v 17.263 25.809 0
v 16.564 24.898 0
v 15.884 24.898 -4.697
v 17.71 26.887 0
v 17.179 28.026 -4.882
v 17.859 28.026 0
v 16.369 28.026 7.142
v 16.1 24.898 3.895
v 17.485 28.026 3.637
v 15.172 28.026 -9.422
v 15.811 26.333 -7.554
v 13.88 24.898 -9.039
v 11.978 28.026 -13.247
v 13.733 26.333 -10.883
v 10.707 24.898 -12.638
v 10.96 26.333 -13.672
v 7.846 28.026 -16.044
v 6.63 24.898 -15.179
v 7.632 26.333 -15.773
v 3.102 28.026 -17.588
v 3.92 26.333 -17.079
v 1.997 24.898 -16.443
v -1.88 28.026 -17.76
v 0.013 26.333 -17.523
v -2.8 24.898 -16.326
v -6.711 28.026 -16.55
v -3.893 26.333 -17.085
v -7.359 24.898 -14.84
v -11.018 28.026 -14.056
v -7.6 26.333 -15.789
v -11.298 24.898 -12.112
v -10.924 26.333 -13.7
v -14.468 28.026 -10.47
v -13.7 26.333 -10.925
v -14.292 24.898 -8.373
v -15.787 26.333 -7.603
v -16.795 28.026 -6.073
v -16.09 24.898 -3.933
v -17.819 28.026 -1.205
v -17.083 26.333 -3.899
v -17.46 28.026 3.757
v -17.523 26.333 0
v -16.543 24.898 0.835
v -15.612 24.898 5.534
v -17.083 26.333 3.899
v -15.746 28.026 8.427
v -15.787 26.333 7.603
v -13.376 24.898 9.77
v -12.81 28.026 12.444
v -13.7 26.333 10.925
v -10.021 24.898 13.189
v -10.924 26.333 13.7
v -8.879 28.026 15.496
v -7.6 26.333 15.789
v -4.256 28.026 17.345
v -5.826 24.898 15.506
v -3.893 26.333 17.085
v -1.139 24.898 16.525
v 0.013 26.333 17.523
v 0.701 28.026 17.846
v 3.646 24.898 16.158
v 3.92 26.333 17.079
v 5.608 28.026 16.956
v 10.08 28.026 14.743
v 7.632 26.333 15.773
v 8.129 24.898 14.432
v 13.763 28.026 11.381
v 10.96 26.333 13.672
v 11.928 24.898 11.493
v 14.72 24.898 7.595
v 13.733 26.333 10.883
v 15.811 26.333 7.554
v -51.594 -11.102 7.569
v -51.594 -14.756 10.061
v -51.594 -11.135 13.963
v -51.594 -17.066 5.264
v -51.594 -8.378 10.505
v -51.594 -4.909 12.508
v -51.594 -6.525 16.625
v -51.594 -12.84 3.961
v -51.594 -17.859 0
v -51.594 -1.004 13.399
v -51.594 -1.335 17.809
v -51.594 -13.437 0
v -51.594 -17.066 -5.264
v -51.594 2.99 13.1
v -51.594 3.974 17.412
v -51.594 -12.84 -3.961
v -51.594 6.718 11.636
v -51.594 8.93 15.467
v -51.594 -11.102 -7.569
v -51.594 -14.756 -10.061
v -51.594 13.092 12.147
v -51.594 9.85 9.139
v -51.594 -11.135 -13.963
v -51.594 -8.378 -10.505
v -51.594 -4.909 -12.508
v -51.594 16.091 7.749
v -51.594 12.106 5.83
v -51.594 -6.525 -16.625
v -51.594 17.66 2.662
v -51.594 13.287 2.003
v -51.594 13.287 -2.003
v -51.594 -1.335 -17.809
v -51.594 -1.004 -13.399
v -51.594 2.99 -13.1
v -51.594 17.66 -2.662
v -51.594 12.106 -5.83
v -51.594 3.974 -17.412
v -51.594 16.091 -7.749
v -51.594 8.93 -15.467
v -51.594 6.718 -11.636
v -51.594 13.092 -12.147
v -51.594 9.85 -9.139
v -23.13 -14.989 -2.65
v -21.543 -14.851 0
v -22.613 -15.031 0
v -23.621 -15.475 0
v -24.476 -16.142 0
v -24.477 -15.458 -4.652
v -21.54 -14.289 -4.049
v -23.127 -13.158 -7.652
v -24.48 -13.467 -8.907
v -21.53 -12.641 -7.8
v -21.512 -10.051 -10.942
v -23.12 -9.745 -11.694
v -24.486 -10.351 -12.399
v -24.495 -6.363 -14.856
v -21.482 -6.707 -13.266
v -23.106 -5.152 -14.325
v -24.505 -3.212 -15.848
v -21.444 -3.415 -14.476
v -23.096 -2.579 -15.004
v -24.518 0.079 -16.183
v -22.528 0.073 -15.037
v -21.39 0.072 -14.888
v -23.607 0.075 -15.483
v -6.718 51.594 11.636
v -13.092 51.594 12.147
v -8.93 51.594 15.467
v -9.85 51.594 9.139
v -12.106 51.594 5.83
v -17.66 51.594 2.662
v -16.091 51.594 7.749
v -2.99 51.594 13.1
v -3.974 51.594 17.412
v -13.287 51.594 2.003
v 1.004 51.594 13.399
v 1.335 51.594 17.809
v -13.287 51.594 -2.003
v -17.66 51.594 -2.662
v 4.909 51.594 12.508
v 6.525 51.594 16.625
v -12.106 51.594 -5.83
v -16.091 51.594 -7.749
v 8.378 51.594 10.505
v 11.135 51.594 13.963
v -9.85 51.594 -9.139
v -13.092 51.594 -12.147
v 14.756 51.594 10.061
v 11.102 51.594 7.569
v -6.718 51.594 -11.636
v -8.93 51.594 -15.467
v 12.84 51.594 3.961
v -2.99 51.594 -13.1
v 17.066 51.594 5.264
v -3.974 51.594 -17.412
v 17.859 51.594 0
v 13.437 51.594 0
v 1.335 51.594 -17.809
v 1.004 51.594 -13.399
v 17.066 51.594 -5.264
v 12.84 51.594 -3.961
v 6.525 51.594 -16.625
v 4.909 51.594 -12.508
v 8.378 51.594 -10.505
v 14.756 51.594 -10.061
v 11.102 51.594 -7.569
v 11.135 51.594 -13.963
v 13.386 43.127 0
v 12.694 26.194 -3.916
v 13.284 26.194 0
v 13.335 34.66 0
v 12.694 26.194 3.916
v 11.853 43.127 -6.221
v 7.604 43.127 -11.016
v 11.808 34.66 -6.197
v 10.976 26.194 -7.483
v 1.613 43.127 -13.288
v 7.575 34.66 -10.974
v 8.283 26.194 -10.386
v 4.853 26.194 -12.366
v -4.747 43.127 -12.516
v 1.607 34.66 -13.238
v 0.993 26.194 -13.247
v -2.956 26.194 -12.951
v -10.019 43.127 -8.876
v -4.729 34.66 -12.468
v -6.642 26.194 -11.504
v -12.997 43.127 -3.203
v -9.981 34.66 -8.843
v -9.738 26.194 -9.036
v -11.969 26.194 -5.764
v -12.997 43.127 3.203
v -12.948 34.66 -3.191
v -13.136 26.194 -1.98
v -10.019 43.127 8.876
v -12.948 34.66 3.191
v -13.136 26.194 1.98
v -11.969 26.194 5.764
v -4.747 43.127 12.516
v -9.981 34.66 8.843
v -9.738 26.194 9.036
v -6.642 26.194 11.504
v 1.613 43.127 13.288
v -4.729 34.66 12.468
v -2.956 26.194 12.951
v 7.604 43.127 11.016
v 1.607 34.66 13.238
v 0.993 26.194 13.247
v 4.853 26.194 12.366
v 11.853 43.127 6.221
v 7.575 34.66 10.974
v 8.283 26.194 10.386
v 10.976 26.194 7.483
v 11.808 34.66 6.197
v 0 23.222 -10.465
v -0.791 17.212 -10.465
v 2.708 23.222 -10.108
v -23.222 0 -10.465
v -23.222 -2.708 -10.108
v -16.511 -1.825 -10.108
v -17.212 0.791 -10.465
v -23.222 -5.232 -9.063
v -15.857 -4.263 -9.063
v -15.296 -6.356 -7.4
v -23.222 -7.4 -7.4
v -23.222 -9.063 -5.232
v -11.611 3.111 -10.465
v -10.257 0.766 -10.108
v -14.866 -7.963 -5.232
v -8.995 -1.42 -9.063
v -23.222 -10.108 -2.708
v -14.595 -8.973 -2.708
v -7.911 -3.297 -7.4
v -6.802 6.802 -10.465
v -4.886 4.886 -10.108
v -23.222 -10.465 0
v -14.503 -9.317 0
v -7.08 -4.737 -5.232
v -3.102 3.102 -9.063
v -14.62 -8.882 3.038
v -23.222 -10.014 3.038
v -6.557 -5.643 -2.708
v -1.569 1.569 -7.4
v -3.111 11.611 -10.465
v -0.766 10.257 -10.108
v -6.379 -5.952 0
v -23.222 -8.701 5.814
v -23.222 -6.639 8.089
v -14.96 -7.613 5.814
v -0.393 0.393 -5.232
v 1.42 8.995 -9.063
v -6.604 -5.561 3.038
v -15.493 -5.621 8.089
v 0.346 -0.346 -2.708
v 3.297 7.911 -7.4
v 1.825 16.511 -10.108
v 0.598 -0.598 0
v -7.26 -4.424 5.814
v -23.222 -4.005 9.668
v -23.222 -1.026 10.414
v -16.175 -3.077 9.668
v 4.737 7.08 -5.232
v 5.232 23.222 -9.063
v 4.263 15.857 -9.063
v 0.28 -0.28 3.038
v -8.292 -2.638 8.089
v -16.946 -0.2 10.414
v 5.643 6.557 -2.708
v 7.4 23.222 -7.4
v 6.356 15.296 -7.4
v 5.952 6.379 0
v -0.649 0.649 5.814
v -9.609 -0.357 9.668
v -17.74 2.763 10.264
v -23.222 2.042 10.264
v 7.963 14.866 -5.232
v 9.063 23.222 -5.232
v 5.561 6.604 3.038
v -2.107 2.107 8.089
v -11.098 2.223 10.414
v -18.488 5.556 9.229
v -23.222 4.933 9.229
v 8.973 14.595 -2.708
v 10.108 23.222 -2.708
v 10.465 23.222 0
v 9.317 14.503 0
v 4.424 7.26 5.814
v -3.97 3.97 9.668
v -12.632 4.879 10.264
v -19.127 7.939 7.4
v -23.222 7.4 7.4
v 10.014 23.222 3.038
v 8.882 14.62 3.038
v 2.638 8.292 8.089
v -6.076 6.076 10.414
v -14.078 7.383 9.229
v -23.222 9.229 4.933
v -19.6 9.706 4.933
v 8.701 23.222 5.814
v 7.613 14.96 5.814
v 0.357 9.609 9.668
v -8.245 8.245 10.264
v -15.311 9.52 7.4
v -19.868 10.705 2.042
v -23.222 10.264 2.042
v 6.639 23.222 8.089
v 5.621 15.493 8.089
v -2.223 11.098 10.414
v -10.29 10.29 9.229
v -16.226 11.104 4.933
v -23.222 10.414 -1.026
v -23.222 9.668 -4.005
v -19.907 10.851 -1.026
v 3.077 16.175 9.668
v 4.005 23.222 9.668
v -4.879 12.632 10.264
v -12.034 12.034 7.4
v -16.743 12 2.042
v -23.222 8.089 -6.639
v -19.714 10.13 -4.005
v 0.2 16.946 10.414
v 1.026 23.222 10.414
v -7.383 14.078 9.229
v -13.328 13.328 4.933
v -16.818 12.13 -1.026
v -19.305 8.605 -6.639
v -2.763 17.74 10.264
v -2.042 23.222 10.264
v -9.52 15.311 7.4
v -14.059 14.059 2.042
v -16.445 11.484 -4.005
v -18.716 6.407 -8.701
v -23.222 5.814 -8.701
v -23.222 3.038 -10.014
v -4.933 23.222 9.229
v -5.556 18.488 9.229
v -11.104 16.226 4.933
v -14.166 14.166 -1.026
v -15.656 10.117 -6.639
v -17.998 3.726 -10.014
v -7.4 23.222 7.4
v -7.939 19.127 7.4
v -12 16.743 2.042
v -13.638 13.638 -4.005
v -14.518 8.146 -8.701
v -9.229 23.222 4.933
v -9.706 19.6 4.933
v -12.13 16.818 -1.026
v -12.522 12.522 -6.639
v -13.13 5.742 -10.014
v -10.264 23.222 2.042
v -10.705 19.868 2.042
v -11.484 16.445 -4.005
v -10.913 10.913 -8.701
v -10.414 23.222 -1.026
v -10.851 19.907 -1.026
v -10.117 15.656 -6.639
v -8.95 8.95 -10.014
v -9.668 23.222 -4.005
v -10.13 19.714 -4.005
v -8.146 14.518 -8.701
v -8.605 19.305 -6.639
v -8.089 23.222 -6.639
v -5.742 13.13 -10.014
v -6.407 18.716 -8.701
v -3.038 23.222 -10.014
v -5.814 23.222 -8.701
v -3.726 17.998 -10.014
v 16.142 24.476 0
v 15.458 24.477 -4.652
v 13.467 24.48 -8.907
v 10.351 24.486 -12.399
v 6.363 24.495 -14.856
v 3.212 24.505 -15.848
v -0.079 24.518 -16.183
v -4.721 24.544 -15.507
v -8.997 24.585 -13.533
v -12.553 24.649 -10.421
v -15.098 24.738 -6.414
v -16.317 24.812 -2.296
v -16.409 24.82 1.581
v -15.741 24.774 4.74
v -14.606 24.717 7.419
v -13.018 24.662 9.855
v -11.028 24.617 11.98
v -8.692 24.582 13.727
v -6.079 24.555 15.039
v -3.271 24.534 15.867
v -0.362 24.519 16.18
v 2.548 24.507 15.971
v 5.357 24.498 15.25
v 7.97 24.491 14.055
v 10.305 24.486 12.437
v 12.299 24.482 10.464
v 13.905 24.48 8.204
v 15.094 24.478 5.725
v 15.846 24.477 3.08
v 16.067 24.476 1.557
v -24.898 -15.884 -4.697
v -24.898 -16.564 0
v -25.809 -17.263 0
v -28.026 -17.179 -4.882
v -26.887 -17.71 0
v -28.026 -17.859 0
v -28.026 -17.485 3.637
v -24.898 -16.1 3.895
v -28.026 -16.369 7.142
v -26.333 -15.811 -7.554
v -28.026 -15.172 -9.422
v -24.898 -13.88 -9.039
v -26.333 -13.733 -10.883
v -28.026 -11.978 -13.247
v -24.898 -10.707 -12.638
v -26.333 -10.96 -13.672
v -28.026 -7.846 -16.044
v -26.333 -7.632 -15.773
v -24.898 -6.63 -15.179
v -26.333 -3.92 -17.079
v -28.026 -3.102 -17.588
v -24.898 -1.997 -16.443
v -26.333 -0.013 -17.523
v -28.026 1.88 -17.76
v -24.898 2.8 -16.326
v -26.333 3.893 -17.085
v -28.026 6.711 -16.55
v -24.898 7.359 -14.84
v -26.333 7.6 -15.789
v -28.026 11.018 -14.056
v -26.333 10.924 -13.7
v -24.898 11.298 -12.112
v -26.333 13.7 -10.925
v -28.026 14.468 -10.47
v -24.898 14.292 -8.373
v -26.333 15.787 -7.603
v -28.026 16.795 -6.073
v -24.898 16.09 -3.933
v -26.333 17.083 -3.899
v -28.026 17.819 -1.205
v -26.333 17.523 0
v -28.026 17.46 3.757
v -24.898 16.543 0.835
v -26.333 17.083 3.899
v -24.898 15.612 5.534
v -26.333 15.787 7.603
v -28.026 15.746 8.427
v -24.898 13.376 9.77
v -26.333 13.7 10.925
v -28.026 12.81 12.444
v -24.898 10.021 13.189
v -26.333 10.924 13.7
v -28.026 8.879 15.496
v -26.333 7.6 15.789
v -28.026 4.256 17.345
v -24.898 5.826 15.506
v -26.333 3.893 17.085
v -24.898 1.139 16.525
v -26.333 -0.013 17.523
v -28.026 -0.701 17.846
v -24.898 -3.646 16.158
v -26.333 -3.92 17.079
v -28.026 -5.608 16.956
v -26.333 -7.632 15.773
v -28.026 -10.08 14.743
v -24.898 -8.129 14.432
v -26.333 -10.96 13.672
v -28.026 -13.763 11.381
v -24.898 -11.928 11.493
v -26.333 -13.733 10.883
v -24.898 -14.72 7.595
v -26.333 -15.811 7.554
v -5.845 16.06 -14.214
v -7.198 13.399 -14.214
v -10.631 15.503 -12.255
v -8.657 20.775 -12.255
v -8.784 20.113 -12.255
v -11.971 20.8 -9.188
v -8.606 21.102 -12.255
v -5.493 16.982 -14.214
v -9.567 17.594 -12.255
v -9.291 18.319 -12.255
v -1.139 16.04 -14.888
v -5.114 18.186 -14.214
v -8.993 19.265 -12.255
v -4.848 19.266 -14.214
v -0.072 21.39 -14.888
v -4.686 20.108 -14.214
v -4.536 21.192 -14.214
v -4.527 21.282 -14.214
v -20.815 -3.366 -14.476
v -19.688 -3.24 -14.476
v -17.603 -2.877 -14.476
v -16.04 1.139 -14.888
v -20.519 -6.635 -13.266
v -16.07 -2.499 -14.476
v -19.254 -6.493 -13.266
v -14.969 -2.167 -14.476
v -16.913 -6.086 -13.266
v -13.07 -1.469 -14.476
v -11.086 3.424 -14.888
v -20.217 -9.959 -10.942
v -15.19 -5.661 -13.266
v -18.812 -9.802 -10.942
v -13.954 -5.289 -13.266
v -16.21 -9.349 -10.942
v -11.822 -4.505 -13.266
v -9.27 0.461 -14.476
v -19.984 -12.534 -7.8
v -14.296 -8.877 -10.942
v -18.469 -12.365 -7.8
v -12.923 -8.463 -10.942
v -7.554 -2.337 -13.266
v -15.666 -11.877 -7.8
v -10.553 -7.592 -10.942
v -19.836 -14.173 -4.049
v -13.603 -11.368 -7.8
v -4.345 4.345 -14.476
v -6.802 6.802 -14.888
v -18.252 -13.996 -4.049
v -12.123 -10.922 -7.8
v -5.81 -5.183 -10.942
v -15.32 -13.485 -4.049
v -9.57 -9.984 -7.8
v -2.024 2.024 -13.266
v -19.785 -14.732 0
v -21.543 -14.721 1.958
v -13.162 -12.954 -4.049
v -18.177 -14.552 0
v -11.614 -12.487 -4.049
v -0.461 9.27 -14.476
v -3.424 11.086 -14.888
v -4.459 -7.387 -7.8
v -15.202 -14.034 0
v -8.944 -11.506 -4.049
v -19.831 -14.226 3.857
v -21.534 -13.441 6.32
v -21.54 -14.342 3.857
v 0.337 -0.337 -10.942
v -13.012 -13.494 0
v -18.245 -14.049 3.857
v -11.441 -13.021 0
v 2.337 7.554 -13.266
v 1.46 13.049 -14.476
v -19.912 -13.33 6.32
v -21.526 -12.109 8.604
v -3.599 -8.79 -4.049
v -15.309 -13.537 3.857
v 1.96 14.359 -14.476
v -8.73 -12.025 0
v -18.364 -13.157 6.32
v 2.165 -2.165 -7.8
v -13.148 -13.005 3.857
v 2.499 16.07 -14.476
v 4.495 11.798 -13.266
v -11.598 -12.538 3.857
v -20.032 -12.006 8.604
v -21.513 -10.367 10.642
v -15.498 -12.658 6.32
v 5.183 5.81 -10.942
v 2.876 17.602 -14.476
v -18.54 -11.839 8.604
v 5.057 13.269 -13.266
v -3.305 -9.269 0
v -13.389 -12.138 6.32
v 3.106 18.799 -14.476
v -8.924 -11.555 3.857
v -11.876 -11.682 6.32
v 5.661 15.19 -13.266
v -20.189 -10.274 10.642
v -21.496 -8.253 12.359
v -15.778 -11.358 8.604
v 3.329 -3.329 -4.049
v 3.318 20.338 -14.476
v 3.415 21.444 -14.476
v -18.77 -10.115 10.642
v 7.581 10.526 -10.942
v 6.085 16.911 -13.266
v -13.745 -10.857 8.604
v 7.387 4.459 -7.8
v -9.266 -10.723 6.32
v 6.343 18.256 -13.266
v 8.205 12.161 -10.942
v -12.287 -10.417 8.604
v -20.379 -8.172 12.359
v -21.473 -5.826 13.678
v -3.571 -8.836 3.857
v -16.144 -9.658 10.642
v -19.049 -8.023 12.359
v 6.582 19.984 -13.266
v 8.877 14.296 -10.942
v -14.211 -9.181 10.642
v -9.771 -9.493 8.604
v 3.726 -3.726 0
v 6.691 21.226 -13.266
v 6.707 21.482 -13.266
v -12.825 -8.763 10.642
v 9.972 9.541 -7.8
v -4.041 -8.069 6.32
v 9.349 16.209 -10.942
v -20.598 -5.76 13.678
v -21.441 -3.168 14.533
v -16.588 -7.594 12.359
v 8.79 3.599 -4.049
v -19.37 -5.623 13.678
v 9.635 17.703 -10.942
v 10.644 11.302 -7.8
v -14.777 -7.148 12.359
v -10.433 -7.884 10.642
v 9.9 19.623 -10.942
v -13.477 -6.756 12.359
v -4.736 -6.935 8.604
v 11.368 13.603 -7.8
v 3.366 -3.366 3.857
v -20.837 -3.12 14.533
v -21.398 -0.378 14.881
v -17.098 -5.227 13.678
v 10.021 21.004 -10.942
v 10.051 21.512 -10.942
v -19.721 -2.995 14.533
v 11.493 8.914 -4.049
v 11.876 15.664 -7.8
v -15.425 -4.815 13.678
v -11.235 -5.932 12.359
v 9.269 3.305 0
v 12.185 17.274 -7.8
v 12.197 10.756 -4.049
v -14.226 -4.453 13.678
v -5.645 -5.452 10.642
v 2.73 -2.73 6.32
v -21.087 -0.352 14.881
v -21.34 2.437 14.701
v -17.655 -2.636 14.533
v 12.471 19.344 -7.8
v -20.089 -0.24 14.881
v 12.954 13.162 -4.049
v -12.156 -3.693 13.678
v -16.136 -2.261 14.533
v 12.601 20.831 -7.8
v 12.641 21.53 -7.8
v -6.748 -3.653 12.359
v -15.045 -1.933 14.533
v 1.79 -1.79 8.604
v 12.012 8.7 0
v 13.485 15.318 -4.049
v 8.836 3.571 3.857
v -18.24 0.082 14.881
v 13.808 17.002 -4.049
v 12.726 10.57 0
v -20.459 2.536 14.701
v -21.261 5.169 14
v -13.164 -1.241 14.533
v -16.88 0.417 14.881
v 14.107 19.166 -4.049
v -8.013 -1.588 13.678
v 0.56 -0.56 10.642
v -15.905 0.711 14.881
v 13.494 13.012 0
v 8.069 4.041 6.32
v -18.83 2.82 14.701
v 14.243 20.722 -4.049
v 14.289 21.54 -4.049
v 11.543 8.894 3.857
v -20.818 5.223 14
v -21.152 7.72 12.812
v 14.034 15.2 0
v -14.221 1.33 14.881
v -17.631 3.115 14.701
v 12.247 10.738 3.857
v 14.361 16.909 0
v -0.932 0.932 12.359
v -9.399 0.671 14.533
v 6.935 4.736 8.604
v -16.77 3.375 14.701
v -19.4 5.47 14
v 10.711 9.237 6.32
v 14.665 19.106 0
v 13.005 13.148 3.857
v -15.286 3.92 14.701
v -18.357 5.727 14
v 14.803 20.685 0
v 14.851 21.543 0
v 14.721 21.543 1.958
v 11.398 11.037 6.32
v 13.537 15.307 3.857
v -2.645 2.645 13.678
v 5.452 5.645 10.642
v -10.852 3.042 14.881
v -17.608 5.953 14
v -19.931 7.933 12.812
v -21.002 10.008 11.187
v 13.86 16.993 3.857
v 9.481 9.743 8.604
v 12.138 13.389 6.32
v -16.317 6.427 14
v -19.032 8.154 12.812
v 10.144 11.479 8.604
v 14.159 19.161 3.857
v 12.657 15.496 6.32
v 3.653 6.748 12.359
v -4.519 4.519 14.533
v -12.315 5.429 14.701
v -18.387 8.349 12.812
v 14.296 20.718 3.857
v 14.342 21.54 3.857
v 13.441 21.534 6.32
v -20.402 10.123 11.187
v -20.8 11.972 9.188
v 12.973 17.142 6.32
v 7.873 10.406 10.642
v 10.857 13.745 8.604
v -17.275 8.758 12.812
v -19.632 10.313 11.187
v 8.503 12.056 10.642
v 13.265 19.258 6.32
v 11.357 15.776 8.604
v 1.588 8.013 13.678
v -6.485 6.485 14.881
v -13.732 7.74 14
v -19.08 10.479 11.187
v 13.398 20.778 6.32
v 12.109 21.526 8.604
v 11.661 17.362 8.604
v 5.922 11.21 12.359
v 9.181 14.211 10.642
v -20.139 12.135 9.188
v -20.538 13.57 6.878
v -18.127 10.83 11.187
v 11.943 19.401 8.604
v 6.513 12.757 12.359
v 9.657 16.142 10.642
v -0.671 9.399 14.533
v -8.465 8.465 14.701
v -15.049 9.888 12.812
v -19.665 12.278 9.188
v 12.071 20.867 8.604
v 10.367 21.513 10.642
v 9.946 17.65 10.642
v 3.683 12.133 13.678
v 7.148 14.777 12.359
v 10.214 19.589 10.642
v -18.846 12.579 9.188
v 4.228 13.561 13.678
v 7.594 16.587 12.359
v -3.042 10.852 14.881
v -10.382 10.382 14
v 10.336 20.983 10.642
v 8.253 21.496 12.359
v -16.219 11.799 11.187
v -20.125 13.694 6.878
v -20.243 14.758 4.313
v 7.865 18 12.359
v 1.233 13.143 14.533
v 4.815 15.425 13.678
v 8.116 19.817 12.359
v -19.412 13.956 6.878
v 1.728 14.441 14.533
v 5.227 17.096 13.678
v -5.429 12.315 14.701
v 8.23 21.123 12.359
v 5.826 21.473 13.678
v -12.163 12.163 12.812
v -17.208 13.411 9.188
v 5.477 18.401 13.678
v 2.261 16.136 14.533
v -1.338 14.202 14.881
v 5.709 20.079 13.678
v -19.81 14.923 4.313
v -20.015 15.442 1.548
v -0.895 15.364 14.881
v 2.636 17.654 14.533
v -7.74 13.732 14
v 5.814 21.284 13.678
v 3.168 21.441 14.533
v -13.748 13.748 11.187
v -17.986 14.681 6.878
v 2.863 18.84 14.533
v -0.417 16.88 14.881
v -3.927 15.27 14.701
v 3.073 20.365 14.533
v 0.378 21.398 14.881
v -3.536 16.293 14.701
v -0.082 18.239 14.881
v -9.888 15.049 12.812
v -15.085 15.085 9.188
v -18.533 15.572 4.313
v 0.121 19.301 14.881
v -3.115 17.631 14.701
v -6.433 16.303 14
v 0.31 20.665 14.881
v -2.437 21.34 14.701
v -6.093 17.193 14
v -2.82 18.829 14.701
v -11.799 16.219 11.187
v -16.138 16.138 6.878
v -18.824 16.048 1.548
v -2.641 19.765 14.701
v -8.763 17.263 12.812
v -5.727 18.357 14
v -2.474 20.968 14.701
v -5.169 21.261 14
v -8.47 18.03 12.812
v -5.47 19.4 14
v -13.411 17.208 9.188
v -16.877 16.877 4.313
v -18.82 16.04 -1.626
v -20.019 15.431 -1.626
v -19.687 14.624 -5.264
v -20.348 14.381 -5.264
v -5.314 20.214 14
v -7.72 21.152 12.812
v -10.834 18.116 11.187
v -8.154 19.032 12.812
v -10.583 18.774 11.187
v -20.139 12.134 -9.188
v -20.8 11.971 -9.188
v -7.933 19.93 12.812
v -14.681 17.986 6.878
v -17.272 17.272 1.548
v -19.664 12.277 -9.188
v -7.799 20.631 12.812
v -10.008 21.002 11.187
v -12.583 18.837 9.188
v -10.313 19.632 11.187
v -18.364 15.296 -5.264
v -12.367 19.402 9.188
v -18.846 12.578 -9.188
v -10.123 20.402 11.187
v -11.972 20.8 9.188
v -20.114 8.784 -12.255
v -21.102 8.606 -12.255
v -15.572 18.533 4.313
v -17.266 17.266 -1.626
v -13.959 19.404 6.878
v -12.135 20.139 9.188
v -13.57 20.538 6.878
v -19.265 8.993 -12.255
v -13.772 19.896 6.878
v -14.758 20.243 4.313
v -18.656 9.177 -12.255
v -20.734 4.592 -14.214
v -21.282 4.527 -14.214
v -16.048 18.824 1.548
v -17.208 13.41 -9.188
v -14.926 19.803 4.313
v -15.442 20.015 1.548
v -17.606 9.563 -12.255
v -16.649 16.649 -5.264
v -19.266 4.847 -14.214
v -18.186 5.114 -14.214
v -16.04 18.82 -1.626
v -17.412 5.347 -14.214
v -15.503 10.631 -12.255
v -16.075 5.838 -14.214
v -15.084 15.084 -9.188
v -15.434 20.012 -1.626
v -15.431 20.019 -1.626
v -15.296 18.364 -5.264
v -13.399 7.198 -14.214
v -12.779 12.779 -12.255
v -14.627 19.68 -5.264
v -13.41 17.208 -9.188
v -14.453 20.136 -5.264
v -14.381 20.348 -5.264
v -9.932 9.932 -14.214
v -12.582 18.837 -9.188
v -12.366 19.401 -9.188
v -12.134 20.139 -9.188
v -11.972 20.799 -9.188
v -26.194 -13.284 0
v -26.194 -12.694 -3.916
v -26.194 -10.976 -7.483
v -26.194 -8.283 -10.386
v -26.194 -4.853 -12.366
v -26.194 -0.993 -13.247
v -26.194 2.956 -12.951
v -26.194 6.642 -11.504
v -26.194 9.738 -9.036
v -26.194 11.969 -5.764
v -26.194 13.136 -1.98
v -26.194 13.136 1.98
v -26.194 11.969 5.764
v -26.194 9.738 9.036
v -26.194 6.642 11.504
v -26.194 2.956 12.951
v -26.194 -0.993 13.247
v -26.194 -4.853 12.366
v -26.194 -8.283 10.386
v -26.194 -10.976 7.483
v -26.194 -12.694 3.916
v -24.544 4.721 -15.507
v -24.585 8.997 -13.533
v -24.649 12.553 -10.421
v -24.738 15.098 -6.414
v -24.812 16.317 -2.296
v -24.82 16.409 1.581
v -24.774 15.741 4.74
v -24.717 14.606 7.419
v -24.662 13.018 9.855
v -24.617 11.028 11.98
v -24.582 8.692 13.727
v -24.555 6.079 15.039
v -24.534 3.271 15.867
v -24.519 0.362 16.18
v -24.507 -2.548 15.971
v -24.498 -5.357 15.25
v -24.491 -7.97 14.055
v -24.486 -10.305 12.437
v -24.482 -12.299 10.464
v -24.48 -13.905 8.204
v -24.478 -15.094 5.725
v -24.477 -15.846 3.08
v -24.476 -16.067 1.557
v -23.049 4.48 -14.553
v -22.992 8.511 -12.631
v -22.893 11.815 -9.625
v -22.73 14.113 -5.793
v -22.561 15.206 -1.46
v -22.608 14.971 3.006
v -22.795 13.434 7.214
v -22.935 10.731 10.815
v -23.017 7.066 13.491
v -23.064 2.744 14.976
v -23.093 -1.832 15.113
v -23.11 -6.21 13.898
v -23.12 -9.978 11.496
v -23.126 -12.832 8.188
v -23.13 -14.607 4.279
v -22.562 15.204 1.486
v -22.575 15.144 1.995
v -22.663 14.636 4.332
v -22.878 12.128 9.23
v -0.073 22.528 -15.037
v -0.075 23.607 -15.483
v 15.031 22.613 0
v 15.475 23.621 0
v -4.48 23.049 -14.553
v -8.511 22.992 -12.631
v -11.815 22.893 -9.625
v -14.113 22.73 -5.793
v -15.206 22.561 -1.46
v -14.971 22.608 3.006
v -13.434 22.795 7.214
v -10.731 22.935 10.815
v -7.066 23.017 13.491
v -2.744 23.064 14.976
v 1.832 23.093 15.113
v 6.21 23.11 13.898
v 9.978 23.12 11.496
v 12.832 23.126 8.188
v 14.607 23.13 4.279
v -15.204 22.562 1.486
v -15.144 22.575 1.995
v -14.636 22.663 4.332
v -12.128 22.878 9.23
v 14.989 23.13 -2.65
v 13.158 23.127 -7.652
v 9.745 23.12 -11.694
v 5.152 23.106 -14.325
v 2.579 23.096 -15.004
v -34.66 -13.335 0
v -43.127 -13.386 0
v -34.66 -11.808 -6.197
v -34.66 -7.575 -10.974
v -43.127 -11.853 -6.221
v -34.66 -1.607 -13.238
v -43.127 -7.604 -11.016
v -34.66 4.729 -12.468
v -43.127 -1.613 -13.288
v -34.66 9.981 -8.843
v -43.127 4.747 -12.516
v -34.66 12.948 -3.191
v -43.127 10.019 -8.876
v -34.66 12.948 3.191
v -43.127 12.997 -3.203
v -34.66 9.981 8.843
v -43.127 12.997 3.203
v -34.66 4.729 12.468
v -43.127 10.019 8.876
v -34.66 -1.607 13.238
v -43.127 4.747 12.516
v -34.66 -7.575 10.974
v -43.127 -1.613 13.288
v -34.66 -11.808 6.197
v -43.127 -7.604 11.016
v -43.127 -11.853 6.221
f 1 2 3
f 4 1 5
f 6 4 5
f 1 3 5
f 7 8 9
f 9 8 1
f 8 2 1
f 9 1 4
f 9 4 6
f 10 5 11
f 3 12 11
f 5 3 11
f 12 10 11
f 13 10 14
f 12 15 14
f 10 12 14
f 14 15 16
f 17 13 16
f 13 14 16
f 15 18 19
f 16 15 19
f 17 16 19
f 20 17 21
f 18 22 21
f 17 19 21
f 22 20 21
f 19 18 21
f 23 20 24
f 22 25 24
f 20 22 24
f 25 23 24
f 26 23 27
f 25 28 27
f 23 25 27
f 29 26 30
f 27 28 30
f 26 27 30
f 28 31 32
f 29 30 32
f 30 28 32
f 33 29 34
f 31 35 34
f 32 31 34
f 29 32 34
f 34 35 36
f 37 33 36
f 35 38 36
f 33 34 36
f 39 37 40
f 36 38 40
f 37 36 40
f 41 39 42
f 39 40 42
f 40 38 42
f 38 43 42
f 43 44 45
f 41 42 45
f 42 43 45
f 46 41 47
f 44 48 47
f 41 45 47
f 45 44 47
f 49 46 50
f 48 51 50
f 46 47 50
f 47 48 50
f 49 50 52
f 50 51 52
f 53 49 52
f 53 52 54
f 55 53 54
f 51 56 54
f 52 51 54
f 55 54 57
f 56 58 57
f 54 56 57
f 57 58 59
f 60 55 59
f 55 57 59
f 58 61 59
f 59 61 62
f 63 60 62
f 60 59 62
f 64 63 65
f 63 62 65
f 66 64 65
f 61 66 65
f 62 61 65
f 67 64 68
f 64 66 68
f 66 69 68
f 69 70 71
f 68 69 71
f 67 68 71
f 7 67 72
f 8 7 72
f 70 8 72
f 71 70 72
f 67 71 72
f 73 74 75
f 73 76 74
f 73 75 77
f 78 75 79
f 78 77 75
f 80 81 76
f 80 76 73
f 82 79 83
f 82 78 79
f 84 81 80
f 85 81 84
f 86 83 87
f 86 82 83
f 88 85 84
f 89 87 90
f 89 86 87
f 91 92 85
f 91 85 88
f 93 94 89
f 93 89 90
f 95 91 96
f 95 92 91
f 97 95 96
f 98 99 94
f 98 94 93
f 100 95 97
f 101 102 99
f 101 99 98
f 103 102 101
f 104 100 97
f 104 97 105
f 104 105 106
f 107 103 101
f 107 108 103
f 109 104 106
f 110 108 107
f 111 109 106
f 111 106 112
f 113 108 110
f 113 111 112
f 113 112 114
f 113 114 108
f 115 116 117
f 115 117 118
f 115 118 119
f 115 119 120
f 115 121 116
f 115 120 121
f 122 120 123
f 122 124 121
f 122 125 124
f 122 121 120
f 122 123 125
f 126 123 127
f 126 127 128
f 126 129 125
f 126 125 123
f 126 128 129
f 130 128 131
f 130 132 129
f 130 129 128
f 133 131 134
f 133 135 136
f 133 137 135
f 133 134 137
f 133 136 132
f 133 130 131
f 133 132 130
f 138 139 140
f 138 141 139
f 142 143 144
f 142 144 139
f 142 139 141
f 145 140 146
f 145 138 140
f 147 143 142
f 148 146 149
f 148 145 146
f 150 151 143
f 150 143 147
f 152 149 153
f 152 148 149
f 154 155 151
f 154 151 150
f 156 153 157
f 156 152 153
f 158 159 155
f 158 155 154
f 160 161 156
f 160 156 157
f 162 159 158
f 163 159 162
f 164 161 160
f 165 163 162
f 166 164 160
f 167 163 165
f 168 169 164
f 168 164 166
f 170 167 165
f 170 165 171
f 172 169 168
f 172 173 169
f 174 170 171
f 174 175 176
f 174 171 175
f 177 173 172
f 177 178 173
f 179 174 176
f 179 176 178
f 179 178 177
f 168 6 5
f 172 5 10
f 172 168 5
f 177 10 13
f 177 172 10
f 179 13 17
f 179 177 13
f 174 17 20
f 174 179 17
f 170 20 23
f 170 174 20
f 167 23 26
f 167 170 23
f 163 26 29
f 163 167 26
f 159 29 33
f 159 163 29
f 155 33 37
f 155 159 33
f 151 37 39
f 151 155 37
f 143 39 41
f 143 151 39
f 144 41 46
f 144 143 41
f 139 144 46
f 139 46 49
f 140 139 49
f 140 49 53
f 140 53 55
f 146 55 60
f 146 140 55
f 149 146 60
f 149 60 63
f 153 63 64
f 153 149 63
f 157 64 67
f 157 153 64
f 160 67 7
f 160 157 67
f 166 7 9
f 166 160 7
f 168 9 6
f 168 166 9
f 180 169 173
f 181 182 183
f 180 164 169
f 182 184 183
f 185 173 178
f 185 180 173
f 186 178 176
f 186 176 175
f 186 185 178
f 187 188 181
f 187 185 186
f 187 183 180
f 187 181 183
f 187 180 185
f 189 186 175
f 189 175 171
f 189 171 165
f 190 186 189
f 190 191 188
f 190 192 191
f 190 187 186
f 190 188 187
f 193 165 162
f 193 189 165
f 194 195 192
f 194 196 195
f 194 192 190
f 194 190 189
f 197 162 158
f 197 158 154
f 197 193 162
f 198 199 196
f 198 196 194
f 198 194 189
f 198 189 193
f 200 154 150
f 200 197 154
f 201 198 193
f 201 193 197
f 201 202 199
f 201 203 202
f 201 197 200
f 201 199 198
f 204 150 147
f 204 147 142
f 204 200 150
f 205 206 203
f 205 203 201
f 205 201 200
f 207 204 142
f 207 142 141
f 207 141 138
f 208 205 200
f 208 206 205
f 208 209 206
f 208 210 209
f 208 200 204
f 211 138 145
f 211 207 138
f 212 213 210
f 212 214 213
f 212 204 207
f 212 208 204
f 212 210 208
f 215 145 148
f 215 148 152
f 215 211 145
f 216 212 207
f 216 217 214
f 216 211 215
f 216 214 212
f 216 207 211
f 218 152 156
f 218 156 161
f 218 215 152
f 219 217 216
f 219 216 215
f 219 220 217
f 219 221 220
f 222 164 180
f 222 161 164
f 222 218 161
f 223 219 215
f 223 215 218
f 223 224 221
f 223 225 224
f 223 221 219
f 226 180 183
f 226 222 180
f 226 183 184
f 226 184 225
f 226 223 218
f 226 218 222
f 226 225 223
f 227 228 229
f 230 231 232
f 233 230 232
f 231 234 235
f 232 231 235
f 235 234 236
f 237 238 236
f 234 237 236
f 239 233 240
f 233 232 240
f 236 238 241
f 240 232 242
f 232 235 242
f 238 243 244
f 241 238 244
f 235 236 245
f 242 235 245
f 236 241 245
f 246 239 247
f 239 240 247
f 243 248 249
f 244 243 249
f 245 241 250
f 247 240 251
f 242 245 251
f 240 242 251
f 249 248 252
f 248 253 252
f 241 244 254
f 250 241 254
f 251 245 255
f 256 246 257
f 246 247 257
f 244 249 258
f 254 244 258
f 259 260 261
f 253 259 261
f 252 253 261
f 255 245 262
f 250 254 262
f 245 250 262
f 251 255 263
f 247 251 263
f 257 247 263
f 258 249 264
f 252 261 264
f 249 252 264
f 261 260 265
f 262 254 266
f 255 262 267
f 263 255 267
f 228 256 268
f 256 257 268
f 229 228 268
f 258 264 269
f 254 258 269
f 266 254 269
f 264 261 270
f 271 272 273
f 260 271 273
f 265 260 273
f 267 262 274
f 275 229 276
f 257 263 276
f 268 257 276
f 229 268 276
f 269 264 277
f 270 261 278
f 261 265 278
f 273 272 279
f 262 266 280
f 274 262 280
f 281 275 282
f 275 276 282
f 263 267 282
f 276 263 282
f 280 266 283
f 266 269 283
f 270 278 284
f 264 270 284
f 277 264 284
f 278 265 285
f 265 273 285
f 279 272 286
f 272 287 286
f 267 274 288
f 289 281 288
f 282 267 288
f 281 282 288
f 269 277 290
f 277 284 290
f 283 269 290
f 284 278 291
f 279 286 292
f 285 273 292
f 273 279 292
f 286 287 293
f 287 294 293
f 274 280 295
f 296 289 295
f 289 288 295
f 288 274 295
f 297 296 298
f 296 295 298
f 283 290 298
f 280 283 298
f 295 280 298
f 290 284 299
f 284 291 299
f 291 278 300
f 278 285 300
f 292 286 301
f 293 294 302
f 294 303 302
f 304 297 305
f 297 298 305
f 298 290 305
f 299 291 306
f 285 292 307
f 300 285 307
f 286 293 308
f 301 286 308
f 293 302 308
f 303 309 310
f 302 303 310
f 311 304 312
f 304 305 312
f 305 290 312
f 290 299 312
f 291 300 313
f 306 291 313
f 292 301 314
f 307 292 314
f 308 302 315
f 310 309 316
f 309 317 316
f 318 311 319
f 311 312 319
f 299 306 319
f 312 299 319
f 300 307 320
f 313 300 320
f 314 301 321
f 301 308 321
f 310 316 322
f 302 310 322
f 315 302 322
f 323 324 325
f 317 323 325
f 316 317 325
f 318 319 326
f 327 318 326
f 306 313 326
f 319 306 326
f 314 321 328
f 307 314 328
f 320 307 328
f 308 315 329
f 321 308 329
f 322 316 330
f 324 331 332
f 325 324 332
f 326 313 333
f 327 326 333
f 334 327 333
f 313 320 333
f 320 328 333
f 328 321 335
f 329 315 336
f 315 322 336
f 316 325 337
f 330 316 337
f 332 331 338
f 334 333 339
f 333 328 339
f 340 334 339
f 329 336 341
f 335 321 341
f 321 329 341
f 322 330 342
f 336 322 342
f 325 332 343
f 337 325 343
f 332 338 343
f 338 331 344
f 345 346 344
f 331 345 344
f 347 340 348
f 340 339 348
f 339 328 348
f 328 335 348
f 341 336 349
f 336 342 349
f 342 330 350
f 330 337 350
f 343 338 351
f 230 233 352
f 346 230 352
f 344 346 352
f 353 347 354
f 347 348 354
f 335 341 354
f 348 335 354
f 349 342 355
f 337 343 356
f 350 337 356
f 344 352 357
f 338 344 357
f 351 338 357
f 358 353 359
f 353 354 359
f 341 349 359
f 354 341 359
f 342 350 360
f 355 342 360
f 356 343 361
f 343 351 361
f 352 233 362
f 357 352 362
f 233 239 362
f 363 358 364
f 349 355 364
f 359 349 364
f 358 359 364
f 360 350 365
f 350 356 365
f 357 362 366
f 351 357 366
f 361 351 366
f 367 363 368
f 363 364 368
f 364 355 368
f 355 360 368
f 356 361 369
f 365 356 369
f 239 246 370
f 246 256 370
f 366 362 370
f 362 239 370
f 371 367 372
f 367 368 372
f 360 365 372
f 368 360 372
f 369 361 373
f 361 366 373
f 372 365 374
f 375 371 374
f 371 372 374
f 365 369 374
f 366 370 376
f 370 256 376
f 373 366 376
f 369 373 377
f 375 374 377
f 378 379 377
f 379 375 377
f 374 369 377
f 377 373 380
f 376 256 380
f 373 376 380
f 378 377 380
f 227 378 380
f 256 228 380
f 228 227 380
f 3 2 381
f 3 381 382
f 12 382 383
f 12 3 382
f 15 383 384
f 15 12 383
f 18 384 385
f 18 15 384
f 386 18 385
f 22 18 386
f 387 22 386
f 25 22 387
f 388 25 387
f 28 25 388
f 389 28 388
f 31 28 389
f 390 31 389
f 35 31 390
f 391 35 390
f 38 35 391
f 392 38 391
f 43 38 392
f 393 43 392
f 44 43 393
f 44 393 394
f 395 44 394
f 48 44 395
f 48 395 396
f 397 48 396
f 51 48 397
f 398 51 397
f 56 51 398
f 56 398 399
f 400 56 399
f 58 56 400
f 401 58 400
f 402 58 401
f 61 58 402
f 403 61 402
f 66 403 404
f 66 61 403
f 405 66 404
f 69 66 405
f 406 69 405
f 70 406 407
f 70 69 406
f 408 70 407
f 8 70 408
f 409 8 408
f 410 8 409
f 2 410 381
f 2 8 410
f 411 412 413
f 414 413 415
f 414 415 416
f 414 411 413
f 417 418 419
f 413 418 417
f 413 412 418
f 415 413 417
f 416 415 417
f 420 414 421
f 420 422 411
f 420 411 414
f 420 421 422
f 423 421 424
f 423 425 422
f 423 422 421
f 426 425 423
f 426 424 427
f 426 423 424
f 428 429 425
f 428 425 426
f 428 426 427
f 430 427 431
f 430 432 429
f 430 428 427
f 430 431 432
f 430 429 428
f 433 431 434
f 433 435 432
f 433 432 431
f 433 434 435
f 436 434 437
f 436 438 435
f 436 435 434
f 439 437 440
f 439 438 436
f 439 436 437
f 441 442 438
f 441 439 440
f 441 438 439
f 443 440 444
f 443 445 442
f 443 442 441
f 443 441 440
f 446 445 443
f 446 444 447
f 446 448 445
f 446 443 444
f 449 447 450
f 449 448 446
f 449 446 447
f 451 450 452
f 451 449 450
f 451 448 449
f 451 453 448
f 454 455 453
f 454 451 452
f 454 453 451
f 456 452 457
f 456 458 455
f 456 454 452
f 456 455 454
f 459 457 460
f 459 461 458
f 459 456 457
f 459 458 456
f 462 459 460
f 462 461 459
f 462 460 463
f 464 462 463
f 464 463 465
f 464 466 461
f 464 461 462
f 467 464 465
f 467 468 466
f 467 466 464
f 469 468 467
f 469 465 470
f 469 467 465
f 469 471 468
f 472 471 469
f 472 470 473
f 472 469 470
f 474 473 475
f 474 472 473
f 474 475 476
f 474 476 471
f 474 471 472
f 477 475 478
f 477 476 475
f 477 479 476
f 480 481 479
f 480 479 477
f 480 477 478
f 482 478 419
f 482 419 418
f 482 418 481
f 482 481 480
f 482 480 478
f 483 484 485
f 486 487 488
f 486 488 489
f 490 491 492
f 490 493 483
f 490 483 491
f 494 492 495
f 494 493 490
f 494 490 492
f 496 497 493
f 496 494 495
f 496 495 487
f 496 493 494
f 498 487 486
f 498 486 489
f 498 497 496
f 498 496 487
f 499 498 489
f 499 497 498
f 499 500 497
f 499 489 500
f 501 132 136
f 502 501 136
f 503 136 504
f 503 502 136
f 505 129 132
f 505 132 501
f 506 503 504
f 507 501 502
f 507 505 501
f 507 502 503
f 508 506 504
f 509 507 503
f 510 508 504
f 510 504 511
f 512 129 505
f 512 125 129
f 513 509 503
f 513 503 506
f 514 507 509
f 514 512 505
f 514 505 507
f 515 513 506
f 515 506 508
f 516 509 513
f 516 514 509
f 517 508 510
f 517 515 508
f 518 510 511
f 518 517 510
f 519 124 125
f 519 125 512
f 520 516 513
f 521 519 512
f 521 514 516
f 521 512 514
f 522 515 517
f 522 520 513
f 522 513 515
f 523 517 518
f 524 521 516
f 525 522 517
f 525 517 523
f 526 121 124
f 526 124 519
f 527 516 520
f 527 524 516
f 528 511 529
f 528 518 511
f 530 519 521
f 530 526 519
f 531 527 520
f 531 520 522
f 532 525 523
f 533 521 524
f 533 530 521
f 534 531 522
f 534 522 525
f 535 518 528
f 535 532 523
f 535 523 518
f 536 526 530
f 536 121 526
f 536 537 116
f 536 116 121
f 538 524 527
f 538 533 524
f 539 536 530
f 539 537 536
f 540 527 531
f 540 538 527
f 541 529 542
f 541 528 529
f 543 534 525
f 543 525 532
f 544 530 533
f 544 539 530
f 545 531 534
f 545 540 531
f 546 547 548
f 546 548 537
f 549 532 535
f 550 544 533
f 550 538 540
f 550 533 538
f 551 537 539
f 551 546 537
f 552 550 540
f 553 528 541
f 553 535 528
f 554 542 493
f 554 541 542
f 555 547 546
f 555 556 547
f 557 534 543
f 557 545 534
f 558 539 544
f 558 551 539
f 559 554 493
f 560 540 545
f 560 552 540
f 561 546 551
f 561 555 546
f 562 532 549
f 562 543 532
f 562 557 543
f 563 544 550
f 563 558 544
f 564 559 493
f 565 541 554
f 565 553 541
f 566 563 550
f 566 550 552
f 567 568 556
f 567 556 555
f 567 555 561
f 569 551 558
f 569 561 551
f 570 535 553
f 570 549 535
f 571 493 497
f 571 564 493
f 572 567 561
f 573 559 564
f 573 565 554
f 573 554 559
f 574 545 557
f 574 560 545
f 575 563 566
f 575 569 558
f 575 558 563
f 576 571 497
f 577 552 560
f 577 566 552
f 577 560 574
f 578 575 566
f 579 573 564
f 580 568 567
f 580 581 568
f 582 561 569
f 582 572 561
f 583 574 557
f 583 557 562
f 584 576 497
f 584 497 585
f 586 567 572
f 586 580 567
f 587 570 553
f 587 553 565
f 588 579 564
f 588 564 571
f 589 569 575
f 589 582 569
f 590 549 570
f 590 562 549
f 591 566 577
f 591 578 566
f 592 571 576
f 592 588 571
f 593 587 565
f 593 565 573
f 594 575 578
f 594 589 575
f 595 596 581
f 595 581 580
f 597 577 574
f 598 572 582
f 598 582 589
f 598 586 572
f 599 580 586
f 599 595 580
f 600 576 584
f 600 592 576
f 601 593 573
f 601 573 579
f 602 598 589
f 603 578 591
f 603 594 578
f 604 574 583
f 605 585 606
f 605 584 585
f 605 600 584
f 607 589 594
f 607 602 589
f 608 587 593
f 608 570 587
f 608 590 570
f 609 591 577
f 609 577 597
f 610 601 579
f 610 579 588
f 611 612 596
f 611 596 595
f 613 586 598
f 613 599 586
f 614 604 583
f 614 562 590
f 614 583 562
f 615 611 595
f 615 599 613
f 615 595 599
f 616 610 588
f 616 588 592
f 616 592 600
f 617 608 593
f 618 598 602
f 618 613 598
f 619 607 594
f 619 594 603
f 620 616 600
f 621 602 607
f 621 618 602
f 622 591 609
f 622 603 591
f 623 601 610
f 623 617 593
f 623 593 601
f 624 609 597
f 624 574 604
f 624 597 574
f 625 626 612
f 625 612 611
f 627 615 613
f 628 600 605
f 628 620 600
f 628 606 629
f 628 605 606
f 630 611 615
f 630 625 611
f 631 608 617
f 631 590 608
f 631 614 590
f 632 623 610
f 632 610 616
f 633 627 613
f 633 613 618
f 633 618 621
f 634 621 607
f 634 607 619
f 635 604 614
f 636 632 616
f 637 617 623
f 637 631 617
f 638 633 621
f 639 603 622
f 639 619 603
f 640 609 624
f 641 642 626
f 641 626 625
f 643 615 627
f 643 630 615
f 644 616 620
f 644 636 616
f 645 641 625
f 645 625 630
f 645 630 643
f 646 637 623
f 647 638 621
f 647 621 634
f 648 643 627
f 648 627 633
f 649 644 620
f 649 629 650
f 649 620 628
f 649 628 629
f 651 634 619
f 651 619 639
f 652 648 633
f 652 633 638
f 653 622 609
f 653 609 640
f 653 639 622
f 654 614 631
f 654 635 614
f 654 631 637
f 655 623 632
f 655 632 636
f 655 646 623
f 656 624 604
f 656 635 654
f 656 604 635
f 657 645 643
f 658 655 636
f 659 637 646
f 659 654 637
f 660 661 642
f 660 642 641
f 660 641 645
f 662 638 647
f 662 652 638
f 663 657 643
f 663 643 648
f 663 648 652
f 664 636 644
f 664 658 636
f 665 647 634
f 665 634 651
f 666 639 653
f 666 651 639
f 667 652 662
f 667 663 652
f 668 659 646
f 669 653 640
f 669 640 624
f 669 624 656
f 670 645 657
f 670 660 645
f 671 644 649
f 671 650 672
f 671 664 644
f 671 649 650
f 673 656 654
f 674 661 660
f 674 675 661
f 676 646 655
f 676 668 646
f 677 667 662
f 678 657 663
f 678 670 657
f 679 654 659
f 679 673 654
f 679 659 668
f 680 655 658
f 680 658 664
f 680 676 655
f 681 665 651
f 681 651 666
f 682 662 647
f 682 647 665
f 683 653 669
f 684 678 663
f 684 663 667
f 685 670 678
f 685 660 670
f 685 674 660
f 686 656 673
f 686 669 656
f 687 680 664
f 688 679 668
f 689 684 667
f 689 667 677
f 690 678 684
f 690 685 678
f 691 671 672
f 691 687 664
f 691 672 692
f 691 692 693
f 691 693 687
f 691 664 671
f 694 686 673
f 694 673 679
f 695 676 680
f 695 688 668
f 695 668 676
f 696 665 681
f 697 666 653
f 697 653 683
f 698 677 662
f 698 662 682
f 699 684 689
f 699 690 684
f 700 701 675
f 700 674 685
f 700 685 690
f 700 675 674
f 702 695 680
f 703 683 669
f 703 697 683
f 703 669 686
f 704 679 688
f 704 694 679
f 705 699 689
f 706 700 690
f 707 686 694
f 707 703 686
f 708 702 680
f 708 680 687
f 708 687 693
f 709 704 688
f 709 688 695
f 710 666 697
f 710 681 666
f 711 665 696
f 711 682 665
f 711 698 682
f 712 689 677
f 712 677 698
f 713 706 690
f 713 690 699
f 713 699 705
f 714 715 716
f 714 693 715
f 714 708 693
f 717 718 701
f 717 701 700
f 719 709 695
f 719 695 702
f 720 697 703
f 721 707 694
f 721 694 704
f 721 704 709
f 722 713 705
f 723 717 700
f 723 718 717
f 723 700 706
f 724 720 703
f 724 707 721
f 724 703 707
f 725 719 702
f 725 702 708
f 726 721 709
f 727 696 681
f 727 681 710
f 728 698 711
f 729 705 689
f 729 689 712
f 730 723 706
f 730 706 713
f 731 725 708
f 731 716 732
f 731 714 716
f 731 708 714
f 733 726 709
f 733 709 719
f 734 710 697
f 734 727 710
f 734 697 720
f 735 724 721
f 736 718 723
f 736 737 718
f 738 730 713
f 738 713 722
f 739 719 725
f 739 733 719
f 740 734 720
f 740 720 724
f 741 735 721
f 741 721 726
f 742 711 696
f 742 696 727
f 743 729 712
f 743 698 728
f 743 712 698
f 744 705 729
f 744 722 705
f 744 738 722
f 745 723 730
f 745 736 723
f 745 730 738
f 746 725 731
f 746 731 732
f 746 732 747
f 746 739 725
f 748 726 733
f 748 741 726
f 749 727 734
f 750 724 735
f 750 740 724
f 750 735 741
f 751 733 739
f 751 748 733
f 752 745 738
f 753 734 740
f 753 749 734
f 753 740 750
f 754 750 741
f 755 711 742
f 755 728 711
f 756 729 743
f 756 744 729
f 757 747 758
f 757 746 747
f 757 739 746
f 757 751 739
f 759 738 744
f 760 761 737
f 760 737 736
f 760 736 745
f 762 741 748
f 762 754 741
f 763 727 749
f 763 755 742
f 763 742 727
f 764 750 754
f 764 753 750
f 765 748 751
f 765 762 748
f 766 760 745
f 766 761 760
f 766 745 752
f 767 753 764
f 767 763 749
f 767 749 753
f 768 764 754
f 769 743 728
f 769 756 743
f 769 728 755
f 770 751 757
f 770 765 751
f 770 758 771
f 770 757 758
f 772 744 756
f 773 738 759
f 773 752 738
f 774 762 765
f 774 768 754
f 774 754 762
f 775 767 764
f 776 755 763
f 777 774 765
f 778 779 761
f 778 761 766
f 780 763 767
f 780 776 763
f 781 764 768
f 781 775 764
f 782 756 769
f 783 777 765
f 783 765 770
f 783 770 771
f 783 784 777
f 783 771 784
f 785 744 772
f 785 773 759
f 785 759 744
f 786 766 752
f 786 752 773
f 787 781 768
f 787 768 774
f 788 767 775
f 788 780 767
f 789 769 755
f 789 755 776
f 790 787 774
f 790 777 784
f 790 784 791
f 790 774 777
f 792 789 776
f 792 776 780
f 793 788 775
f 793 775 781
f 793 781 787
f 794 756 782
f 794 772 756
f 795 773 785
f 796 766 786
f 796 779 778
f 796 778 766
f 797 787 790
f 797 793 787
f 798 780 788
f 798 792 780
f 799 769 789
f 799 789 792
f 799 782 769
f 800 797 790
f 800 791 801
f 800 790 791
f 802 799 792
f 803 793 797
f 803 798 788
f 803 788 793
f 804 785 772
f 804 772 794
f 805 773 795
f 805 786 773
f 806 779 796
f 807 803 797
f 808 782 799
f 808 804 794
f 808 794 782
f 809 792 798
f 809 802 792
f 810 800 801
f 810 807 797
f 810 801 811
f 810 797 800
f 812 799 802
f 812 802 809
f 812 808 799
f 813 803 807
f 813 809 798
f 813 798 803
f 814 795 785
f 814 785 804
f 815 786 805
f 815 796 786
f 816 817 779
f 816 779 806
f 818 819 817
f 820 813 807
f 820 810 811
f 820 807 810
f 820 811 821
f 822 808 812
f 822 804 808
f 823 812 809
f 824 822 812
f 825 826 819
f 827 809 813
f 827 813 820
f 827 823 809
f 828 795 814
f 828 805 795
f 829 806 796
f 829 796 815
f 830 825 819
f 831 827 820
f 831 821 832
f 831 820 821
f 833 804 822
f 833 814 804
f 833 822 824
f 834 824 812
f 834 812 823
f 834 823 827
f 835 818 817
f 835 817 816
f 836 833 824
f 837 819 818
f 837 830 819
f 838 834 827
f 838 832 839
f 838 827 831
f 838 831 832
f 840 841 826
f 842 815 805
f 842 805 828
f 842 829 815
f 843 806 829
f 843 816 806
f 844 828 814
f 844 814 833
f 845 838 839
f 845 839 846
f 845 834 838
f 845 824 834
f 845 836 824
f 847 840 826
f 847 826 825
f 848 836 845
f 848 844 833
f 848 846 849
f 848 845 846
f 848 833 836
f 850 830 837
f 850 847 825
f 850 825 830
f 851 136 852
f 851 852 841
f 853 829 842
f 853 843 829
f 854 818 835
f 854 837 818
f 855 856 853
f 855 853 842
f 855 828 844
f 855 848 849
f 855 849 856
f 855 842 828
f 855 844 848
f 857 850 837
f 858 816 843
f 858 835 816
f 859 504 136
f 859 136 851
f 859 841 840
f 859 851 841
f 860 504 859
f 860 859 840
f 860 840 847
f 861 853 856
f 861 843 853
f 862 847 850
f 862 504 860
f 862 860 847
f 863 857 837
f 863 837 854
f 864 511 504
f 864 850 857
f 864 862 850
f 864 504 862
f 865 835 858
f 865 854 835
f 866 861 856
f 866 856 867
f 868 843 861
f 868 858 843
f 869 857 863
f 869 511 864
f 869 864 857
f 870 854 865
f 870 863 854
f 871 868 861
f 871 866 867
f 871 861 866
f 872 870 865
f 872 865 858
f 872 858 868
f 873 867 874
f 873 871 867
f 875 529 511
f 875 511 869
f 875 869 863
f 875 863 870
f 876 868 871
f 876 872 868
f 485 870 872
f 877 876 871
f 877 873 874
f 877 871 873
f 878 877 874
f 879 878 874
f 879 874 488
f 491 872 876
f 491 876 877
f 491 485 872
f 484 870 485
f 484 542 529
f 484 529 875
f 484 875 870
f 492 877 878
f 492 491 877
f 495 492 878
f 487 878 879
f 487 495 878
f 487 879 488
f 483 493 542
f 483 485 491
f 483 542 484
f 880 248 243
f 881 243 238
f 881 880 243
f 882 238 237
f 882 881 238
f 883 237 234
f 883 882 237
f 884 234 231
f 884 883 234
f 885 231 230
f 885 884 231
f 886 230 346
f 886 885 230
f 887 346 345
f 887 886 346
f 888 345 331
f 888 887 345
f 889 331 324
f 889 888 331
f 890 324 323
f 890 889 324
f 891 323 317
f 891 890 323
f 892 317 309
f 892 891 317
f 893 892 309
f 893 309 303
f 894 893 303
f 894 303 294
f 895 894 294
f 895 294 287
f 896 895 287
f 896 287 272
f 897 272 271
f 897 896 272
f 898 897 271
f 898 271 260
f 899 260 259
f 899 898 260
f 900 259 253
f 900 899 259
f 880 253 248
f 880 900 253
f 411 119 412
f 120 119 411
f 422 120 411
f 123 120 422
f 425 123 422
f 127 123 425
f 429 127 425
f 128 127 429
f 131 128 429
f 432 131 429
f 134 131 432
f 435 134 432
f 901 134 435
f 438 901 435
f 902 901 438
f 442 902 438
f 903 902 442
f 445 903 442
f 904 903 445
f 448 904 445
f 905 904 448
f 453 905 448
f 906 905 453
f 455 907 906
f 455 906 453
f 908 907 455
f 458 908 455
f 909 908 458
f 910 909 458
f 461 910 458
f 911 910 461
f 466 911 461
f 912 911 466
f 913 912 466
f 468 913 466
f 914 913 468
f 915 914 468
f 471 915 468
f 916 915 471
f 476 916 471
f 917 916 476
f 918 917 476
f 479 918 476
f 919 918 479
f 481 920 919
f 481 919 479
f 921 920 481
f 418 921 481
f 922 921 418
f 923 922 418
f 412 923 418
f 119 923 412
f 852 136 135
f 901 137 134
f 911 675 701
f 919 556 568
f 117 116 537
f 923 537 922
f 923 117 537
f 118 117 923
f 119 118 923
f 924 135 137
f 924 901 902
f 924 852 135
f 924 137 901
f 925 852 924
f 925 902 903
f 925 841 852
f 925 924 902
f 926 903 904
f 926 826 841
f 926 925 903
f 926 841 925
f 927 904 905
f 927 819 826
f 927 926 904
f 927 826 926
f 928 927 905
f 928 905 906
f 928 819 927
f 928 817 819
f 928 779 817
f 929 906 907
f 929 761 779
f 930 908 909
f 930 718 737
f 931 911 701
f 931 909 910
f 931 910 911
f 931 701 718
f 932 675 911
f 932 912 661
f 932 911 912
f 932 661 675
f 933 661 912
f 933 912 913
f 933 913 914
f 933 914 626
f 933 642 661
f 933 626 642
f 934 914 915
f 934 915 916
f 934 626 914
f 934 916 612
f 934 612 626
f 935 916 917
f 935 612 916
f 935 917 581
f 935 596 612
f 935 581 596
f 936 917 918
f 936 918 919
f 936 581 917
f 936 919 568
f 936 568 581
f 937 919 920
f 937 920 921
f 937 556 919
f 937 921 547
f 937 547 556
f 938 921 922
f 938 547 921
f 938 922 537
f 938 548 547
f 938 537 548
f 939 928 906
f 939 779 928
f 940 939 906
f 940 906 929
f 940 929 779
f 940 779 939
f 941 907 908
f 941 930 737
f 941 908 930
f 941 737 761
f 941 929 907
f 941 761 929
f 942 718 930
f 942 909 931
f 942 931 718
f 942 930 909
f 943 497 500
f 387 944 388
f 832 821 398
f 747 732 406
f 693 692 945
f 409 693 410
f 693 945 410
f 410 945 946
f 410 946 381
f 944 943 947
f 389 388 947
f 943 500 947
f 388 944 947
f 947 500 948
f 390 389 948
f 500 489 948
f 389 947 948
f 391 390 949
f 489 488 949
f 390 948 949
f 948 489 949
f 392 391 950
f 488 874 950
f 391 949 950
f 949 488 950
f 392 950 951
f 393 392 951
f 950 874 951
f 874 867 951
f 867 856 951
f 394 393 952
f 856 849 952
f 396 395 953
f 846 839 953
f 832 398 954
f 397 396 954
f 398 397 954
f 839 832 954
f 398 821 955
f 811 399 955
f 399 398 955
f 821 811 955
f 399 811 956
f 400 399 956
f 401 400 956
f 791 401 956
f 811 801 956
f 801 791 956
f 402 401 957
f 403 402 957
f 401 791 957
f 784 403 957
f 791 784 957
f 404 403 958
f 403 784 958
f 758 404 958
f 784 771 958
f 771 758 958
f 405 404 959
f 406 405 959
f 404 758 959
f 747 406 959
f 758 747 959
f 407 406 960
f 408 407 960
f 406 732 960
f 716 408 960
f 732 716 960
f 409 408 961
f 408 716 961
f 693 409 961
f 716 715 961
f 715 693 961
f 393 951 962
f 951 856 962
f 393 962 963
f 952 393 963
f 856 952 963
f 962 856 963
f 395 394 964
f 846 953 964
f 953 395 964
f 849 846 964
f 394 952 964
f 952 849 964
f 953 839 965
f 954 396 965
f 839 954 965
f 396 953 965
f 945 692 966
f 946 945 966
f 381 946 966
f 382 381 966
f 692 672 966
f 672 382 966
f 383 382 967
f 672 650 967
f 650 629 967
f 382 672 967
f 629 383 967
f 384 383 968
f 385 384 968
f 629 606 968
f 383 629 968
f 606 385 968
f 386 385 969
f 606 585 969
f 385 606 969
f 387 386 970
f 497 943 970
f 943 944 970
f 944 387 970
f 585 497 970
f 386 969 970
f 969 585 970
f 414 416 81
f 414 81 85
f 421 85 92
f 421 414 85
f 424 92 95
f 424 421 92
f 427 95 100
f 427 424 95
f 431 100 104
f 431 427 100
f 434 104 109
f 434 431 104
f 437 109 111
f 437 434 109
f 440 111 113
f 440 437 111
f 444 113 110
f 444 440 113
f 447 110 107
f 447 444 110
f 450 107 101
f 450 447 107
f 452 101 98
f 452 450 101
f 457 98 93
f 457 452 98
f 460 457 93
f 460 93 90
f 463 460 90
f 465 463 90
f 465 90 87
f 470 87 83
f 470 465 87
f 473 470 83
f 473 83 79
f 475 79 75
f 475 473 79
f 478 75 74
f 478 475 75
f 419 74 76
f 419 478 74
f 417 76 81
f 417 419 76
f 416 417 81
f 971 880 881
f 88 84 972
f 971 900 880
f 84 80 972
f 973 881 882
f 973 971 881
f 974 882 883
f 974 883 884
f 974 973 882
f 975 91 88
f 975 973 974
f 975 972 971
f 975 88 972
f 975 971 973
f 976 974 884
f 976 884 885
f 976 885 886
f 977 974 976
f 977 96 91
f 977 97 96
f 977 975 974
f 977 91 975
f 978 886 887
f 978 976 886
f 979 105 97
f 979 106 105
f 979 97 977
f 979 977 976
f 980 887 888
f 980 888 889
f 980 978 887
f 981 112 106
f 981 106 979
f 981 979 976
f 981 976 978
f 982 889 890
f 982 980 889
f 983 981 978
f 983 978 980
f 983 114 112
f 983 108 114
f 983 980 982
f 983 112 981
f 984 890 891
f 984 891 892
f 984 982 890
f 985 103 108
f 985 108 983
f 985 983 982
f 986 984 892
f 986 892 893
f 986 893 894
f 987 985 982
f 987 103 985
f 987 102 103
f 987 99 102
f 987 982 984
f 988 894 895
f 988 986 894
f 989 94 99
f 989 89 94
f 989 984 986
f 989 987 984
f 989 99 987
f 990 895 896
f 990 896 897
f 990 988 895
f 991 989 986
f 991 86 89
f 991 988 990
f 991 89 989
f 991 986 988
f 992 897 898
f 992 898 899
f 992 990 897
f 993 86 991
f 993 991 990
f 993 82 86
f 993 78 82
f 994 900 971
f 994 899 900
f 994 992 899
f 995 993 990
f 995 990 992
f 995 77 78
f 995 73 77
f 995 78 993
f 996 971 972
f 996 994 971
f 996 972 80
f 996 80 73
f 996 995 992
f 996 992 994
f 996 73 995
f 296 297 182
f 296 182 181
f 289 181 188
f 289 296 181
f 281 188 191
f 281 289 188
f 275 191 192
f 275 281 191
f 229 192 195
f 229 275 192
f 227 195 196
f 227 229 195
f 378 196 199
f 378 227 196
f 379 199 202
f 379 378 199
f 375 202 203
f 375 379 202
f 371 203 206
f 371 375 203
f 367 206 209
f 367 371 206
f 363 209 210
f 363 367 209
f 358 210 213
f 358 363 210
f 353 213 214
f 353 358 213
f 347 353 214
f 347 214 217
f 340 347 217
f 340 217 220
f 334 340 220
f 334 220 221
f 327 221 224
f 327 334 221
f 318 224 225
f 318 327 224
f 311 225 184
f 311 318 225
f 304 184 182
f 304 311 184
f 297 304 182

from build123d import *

# Parameters (mm, degrees)
SKETCH3_R   = 14.887575
SKETCH3_R_2 = 10.4648
FILLET1_R   = 4.422775


with BuildPart() as part:
    # Sketch1 → Revolve1 (revolve)
    with BuildSketch(Plane.XY):
        Polygon((-26.19375, -17.859375), (-23.22195, -14.887575), (-23.22195, -10.4648), (-26.19375, -13.2842), (-51.59375, -13.4366), (-51.59375, -17.859375), align=None)
    revolve(axis=Axis((-51.59375, 0, 0), (1, 0, 0)))



with BuildPart() as body_2:
    # Sketch2 → Revolve2 (revolve)
    with BuildSketch(Plane.XY):
        Polygon((13.4366, 51.59375), (13.2842, 26.19375), (10.4648, 23.22195), (14.887575, 23.22195), (17.859375, 26.19375), (17.859375, 51.59375), align=None)
    revolve(axis=Axis((0, 0, 0), (0, 1, 0)))


with BuildPart() as part_1:
    add(part.part)

    add(body_2.part)  # Sweep1 merges body 2
    # Sweep1: sweep along a path in Sketch4
    with BuildLine(Plane.XY) as sweep1_path:
        ThreePointArc((-23.22195, 0), (-6.801551683, 6.801551683), (0, 23.22195))
    # Sketch3 → Sweep1 (sweep)
    with BuildSketch(Plane(origin=(-23.22195, 0, 0), x_dir=(0, 0, -1), z_dir=(1, 0, 0))):
        Circle(SKETCH3_R)
        Circle(SKETCH3_R_2, mode=Mode.SUBTRACT)
    sweep(path=sweep1_path.line)

    # Fillet1
    fillet1_edges = [part_1.edges().sort_by_distance(p)[0] for p in [
        (-23.22195, 10.527105238, 10.527105238),
        (-10.527105238, 23.22195, 10.527105238),
        (-17.859375, 26.19375, 0),
        (-26.19375, 17.859375, 0),
    ]]
    fillet(fillet1_edges, radius=FILLET1_R)


solid = part_1.part
